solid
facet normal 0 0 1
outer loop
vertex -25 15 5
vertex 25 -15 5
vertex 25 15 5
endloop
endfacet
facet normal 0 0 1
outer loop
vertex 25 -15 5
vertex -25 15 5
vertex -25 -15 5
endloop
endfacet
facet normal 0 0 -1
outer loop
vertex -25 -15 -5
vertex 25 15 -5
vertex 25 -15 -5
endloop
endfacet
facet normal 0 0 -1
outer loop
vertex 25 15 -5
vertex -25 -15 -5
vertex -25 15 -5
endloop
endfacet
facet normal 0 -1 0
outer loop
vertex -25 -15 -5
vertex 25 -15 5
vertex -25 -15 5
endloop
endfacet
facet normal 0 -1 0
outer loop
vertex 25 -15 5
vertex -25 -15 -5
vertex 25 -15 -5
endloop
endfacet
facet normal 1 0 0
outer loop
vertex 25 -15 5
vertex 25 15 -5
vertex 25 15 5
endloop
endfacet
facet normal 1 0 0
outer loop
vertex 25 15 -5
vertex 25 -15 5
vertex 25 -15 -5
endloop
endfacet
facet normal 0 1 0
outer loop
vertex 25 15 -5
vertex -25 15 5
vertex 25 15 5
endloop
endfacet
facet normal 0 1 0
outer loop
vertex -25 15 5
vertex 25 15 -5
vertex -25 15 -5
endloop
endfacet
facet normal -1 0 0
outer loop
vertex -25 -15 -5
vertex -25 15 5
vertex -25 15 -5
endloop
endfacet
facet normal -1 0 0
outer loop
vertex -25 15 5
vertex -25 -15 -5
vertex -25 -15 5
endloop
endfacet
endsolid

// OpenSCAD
// Parameters
body_length = 50; //[25:100:1]
body_width  = 30; //[15:60:1]
body_height = 10; //[5:20:1]

$fn = 64;

// Main Body (single connected solid)
module component() {
    // Ensure non-degenerate dimensions and visible geometry
    L = max(body_length, 0.1);
    W = max(body_width,  0.1);
    H = max(body_height, 0.1);

    color([0.85, 0.85, 0.8])
        cube([L, W, H], center=true);
}

// Final Model
component();
